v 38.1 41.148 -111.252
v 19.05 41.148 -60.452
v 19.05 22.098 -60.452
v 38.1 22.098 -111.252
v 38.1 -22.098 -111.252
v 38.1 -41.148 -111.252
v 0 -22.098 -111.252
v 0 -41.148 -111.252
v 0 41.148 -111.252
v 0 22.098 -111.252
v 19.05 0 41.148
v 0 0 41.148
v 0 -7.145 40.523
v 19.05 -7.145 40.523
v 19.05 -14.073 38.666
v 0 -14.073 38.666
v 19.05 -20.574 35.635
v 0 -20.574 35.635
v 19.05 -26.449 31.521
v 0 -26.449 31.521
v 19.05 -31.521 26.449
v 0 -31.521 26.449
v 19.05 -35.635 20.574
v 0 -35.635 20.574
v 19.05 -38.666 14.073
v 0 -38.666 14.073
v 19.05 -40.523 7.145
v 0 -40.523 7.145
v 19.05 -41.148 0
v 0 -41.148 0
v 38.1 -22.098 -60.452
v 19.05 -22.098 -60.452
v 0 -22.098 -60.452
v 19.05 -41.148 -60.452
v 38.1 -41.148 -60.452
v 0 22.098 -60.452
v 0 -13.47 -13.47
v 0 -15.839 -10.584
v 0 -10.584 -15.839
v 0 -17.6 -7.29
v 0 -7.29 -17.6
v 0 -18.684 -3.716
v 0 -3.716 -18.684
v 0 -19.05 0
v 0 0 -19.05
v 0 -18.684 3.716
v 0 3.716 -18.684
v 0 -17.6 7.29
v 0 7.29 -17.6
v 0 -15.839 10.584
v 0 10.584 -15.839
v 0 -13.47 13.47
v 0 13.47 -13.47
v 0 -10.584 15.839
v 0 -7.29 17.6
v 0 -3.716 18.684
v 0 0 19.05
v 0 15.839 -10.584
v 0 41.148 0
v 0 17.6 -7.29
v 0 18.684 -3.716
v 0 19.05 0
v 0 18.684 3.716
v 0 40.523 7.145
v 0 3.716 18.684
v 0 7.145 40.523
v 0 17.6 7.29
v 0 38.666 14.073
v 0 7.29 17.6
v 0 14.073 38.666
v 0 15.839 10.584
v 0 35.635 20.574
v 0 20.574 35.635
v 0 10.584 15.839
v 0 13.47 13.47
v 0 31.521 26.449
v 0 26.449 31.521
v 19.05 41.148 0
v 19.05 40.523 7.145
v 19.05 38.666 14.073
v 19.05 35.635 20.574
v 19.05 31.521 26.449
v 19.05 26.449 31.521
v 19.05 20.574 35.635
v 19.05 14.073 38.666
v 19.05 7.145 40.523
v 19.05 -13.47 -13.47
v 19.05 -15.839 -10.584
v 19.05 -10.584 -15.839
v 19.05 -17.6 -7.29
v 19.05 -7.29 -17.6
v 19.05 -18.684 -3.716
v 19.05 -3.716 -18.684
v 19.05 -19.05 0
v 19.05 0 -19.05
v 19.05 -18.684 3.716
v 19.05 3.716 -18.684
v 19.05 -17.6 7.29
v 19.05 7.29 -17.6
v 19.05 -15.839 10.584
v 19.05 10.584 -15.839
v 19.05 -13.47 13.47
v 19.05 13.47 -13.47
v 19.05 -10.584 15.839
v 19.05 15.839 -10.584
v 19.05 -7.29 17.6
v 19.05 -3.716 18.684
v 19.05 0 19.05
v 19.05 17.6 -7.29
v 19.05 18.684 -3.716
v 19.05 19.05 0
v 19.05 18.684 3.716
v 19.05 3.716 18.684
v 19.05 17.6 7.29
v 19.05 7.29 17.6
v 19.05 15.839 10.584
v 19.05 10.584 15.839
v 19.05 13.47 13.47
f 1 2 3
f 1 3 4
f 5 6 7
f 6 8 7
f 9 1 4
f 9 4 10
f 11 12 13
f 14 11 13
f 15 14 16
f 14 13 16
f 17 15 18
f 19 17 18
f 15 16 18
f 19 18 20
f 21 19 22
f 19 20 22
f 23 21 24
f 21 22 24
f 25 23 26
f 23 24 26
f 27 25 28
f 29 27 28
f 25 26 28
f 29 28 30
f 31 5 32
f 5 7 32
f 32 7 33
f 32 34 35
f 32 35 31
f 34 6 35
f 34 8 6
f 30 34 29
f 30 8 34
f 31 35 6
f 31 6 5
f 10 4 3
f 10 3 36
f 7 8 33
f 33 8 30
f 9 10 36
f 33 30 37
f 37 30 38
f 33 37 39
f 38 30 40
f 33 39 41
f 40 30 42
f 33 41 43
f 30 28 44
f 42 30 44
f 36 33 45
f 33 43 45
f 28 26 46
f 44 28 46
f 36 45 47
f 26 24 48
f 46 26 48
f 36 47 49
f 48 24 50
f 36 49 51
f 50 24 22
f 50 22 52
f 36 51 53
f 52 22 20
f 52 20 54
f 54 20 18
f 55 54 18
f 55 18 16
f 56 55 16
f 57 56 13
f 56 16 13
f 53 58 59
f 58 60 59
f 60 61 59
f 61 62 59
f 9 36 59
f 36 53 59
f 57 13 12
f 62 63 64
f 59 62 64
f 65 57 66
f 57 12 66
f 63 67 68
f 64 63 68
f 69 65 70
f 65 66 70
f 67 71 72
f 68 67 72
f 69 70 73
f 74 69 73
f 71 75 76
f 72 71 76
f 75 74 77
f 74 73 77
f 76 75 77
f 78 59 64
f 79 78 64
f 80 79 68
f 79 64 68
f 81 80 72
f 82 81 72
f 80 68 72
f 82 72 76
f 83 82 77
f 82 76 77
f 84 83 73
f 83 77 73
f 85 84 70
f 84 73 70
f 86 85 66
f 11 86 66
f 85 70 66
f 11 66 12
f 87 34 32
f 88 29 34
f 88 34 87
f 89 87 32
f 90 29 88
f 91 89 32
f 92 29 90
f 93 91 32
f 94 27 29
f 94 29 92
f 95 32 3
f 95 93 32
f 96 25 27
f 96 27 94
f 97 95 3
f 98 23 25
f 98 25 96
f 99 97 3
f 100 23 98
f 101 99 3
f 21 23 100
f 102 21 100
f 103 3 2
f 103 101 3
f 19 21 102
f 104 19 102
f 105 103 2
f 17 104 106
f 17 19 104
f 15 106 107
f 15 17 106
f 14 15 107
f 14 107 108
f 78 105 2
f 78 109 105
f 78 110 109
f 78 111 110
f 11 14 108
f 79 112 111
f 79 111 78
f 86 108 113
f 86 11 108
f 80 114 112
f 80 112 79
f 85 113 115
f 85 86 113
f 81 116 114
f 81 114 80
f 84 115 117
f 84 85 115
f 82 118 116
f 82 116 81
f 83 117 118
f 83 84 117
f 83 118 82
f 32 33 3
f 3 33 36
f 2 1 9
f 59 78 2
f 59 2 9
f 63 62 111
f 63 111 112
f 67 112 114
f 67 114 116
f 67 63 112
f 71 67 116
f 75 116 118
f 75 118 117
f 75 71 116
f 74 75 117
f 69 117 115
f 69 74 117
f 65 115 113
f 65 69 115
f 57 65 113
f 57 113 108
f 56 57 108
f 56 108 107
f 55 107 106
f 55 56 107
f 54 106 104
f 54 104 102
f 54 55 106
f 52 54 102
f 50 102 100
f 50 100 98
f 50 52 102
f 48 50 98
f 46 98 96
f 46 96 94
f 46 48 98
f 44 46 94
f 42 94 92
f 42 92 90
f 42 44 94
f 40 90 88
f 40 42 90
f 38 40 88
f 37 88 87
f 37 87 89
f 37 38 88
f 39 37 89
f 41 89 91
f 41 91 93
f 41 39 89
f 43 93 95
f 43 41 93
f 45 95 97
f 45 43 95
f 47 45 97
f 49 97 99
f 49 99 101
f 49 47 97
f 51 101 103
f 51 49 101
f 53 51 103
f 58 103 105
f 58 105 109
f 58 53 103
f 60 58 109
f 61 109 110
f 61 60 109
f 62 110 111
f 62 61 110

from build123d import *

# Parameters (mm, degrees)
F0_R     = 19.05
F1_DEPTH = 19.05
F2_W     = 19.05
F2_H     = 50.8
F3_DEPTH = 19.05
F5_DEPTH = 19.05


with BuildPart() as f1:
    # F0 (on Right) → F1 (new body)
    with BuildSketch(Plane.YZ):
        with BuildLine():
            ThreePointArc((0, 41.148), (-29.09603, 29.09603), (-41.148, 0))
            Line((-41.148, 0), (-41.148, -111.252))
            Line((-41.148, -111.252), (-22.098, -111.252))
            Line((-22.098, -111.252), (-22.098, -60.452))
            Line((-22.098, -60.452), (22.098, -60.452))
            Line((22.098, -60.452), (22.098, -111.252))
            Line((22.098, -111.252), (41.148, -111.252))
            Line((41.148, -111.252), (41.148, 0))
            ThreePointArc((41.148, 0), (29.09603, 29.09603), (0, 41.148))
        make_face()
        Circle(F0_R, mode=Mode.SUBTRACT)
    extrude(amount=F1_DEPTH)

    # F2 (on face) → F3 (join)
    with BuildSketch(Plane.YZ.offset(19.05)):
        with Locations((-31.623, -85.852)):
            Rectangle(F2_W, F2_H)
    extrude(amount=F3_DEPTH)

    # F4 (on face) → F5 (join)
    with BuildSketch(Plane(origin=(0, 41.148, 0), x_dir=(-1, 0, 0), z_dir=(0, 1, 0))):
        Polygon((-19.05, -60.452), (-38.1, -111.252), (-19.05, -111.252), align=None)
    extrude(amount=-F5_DEPTH)


solid = f1.part
